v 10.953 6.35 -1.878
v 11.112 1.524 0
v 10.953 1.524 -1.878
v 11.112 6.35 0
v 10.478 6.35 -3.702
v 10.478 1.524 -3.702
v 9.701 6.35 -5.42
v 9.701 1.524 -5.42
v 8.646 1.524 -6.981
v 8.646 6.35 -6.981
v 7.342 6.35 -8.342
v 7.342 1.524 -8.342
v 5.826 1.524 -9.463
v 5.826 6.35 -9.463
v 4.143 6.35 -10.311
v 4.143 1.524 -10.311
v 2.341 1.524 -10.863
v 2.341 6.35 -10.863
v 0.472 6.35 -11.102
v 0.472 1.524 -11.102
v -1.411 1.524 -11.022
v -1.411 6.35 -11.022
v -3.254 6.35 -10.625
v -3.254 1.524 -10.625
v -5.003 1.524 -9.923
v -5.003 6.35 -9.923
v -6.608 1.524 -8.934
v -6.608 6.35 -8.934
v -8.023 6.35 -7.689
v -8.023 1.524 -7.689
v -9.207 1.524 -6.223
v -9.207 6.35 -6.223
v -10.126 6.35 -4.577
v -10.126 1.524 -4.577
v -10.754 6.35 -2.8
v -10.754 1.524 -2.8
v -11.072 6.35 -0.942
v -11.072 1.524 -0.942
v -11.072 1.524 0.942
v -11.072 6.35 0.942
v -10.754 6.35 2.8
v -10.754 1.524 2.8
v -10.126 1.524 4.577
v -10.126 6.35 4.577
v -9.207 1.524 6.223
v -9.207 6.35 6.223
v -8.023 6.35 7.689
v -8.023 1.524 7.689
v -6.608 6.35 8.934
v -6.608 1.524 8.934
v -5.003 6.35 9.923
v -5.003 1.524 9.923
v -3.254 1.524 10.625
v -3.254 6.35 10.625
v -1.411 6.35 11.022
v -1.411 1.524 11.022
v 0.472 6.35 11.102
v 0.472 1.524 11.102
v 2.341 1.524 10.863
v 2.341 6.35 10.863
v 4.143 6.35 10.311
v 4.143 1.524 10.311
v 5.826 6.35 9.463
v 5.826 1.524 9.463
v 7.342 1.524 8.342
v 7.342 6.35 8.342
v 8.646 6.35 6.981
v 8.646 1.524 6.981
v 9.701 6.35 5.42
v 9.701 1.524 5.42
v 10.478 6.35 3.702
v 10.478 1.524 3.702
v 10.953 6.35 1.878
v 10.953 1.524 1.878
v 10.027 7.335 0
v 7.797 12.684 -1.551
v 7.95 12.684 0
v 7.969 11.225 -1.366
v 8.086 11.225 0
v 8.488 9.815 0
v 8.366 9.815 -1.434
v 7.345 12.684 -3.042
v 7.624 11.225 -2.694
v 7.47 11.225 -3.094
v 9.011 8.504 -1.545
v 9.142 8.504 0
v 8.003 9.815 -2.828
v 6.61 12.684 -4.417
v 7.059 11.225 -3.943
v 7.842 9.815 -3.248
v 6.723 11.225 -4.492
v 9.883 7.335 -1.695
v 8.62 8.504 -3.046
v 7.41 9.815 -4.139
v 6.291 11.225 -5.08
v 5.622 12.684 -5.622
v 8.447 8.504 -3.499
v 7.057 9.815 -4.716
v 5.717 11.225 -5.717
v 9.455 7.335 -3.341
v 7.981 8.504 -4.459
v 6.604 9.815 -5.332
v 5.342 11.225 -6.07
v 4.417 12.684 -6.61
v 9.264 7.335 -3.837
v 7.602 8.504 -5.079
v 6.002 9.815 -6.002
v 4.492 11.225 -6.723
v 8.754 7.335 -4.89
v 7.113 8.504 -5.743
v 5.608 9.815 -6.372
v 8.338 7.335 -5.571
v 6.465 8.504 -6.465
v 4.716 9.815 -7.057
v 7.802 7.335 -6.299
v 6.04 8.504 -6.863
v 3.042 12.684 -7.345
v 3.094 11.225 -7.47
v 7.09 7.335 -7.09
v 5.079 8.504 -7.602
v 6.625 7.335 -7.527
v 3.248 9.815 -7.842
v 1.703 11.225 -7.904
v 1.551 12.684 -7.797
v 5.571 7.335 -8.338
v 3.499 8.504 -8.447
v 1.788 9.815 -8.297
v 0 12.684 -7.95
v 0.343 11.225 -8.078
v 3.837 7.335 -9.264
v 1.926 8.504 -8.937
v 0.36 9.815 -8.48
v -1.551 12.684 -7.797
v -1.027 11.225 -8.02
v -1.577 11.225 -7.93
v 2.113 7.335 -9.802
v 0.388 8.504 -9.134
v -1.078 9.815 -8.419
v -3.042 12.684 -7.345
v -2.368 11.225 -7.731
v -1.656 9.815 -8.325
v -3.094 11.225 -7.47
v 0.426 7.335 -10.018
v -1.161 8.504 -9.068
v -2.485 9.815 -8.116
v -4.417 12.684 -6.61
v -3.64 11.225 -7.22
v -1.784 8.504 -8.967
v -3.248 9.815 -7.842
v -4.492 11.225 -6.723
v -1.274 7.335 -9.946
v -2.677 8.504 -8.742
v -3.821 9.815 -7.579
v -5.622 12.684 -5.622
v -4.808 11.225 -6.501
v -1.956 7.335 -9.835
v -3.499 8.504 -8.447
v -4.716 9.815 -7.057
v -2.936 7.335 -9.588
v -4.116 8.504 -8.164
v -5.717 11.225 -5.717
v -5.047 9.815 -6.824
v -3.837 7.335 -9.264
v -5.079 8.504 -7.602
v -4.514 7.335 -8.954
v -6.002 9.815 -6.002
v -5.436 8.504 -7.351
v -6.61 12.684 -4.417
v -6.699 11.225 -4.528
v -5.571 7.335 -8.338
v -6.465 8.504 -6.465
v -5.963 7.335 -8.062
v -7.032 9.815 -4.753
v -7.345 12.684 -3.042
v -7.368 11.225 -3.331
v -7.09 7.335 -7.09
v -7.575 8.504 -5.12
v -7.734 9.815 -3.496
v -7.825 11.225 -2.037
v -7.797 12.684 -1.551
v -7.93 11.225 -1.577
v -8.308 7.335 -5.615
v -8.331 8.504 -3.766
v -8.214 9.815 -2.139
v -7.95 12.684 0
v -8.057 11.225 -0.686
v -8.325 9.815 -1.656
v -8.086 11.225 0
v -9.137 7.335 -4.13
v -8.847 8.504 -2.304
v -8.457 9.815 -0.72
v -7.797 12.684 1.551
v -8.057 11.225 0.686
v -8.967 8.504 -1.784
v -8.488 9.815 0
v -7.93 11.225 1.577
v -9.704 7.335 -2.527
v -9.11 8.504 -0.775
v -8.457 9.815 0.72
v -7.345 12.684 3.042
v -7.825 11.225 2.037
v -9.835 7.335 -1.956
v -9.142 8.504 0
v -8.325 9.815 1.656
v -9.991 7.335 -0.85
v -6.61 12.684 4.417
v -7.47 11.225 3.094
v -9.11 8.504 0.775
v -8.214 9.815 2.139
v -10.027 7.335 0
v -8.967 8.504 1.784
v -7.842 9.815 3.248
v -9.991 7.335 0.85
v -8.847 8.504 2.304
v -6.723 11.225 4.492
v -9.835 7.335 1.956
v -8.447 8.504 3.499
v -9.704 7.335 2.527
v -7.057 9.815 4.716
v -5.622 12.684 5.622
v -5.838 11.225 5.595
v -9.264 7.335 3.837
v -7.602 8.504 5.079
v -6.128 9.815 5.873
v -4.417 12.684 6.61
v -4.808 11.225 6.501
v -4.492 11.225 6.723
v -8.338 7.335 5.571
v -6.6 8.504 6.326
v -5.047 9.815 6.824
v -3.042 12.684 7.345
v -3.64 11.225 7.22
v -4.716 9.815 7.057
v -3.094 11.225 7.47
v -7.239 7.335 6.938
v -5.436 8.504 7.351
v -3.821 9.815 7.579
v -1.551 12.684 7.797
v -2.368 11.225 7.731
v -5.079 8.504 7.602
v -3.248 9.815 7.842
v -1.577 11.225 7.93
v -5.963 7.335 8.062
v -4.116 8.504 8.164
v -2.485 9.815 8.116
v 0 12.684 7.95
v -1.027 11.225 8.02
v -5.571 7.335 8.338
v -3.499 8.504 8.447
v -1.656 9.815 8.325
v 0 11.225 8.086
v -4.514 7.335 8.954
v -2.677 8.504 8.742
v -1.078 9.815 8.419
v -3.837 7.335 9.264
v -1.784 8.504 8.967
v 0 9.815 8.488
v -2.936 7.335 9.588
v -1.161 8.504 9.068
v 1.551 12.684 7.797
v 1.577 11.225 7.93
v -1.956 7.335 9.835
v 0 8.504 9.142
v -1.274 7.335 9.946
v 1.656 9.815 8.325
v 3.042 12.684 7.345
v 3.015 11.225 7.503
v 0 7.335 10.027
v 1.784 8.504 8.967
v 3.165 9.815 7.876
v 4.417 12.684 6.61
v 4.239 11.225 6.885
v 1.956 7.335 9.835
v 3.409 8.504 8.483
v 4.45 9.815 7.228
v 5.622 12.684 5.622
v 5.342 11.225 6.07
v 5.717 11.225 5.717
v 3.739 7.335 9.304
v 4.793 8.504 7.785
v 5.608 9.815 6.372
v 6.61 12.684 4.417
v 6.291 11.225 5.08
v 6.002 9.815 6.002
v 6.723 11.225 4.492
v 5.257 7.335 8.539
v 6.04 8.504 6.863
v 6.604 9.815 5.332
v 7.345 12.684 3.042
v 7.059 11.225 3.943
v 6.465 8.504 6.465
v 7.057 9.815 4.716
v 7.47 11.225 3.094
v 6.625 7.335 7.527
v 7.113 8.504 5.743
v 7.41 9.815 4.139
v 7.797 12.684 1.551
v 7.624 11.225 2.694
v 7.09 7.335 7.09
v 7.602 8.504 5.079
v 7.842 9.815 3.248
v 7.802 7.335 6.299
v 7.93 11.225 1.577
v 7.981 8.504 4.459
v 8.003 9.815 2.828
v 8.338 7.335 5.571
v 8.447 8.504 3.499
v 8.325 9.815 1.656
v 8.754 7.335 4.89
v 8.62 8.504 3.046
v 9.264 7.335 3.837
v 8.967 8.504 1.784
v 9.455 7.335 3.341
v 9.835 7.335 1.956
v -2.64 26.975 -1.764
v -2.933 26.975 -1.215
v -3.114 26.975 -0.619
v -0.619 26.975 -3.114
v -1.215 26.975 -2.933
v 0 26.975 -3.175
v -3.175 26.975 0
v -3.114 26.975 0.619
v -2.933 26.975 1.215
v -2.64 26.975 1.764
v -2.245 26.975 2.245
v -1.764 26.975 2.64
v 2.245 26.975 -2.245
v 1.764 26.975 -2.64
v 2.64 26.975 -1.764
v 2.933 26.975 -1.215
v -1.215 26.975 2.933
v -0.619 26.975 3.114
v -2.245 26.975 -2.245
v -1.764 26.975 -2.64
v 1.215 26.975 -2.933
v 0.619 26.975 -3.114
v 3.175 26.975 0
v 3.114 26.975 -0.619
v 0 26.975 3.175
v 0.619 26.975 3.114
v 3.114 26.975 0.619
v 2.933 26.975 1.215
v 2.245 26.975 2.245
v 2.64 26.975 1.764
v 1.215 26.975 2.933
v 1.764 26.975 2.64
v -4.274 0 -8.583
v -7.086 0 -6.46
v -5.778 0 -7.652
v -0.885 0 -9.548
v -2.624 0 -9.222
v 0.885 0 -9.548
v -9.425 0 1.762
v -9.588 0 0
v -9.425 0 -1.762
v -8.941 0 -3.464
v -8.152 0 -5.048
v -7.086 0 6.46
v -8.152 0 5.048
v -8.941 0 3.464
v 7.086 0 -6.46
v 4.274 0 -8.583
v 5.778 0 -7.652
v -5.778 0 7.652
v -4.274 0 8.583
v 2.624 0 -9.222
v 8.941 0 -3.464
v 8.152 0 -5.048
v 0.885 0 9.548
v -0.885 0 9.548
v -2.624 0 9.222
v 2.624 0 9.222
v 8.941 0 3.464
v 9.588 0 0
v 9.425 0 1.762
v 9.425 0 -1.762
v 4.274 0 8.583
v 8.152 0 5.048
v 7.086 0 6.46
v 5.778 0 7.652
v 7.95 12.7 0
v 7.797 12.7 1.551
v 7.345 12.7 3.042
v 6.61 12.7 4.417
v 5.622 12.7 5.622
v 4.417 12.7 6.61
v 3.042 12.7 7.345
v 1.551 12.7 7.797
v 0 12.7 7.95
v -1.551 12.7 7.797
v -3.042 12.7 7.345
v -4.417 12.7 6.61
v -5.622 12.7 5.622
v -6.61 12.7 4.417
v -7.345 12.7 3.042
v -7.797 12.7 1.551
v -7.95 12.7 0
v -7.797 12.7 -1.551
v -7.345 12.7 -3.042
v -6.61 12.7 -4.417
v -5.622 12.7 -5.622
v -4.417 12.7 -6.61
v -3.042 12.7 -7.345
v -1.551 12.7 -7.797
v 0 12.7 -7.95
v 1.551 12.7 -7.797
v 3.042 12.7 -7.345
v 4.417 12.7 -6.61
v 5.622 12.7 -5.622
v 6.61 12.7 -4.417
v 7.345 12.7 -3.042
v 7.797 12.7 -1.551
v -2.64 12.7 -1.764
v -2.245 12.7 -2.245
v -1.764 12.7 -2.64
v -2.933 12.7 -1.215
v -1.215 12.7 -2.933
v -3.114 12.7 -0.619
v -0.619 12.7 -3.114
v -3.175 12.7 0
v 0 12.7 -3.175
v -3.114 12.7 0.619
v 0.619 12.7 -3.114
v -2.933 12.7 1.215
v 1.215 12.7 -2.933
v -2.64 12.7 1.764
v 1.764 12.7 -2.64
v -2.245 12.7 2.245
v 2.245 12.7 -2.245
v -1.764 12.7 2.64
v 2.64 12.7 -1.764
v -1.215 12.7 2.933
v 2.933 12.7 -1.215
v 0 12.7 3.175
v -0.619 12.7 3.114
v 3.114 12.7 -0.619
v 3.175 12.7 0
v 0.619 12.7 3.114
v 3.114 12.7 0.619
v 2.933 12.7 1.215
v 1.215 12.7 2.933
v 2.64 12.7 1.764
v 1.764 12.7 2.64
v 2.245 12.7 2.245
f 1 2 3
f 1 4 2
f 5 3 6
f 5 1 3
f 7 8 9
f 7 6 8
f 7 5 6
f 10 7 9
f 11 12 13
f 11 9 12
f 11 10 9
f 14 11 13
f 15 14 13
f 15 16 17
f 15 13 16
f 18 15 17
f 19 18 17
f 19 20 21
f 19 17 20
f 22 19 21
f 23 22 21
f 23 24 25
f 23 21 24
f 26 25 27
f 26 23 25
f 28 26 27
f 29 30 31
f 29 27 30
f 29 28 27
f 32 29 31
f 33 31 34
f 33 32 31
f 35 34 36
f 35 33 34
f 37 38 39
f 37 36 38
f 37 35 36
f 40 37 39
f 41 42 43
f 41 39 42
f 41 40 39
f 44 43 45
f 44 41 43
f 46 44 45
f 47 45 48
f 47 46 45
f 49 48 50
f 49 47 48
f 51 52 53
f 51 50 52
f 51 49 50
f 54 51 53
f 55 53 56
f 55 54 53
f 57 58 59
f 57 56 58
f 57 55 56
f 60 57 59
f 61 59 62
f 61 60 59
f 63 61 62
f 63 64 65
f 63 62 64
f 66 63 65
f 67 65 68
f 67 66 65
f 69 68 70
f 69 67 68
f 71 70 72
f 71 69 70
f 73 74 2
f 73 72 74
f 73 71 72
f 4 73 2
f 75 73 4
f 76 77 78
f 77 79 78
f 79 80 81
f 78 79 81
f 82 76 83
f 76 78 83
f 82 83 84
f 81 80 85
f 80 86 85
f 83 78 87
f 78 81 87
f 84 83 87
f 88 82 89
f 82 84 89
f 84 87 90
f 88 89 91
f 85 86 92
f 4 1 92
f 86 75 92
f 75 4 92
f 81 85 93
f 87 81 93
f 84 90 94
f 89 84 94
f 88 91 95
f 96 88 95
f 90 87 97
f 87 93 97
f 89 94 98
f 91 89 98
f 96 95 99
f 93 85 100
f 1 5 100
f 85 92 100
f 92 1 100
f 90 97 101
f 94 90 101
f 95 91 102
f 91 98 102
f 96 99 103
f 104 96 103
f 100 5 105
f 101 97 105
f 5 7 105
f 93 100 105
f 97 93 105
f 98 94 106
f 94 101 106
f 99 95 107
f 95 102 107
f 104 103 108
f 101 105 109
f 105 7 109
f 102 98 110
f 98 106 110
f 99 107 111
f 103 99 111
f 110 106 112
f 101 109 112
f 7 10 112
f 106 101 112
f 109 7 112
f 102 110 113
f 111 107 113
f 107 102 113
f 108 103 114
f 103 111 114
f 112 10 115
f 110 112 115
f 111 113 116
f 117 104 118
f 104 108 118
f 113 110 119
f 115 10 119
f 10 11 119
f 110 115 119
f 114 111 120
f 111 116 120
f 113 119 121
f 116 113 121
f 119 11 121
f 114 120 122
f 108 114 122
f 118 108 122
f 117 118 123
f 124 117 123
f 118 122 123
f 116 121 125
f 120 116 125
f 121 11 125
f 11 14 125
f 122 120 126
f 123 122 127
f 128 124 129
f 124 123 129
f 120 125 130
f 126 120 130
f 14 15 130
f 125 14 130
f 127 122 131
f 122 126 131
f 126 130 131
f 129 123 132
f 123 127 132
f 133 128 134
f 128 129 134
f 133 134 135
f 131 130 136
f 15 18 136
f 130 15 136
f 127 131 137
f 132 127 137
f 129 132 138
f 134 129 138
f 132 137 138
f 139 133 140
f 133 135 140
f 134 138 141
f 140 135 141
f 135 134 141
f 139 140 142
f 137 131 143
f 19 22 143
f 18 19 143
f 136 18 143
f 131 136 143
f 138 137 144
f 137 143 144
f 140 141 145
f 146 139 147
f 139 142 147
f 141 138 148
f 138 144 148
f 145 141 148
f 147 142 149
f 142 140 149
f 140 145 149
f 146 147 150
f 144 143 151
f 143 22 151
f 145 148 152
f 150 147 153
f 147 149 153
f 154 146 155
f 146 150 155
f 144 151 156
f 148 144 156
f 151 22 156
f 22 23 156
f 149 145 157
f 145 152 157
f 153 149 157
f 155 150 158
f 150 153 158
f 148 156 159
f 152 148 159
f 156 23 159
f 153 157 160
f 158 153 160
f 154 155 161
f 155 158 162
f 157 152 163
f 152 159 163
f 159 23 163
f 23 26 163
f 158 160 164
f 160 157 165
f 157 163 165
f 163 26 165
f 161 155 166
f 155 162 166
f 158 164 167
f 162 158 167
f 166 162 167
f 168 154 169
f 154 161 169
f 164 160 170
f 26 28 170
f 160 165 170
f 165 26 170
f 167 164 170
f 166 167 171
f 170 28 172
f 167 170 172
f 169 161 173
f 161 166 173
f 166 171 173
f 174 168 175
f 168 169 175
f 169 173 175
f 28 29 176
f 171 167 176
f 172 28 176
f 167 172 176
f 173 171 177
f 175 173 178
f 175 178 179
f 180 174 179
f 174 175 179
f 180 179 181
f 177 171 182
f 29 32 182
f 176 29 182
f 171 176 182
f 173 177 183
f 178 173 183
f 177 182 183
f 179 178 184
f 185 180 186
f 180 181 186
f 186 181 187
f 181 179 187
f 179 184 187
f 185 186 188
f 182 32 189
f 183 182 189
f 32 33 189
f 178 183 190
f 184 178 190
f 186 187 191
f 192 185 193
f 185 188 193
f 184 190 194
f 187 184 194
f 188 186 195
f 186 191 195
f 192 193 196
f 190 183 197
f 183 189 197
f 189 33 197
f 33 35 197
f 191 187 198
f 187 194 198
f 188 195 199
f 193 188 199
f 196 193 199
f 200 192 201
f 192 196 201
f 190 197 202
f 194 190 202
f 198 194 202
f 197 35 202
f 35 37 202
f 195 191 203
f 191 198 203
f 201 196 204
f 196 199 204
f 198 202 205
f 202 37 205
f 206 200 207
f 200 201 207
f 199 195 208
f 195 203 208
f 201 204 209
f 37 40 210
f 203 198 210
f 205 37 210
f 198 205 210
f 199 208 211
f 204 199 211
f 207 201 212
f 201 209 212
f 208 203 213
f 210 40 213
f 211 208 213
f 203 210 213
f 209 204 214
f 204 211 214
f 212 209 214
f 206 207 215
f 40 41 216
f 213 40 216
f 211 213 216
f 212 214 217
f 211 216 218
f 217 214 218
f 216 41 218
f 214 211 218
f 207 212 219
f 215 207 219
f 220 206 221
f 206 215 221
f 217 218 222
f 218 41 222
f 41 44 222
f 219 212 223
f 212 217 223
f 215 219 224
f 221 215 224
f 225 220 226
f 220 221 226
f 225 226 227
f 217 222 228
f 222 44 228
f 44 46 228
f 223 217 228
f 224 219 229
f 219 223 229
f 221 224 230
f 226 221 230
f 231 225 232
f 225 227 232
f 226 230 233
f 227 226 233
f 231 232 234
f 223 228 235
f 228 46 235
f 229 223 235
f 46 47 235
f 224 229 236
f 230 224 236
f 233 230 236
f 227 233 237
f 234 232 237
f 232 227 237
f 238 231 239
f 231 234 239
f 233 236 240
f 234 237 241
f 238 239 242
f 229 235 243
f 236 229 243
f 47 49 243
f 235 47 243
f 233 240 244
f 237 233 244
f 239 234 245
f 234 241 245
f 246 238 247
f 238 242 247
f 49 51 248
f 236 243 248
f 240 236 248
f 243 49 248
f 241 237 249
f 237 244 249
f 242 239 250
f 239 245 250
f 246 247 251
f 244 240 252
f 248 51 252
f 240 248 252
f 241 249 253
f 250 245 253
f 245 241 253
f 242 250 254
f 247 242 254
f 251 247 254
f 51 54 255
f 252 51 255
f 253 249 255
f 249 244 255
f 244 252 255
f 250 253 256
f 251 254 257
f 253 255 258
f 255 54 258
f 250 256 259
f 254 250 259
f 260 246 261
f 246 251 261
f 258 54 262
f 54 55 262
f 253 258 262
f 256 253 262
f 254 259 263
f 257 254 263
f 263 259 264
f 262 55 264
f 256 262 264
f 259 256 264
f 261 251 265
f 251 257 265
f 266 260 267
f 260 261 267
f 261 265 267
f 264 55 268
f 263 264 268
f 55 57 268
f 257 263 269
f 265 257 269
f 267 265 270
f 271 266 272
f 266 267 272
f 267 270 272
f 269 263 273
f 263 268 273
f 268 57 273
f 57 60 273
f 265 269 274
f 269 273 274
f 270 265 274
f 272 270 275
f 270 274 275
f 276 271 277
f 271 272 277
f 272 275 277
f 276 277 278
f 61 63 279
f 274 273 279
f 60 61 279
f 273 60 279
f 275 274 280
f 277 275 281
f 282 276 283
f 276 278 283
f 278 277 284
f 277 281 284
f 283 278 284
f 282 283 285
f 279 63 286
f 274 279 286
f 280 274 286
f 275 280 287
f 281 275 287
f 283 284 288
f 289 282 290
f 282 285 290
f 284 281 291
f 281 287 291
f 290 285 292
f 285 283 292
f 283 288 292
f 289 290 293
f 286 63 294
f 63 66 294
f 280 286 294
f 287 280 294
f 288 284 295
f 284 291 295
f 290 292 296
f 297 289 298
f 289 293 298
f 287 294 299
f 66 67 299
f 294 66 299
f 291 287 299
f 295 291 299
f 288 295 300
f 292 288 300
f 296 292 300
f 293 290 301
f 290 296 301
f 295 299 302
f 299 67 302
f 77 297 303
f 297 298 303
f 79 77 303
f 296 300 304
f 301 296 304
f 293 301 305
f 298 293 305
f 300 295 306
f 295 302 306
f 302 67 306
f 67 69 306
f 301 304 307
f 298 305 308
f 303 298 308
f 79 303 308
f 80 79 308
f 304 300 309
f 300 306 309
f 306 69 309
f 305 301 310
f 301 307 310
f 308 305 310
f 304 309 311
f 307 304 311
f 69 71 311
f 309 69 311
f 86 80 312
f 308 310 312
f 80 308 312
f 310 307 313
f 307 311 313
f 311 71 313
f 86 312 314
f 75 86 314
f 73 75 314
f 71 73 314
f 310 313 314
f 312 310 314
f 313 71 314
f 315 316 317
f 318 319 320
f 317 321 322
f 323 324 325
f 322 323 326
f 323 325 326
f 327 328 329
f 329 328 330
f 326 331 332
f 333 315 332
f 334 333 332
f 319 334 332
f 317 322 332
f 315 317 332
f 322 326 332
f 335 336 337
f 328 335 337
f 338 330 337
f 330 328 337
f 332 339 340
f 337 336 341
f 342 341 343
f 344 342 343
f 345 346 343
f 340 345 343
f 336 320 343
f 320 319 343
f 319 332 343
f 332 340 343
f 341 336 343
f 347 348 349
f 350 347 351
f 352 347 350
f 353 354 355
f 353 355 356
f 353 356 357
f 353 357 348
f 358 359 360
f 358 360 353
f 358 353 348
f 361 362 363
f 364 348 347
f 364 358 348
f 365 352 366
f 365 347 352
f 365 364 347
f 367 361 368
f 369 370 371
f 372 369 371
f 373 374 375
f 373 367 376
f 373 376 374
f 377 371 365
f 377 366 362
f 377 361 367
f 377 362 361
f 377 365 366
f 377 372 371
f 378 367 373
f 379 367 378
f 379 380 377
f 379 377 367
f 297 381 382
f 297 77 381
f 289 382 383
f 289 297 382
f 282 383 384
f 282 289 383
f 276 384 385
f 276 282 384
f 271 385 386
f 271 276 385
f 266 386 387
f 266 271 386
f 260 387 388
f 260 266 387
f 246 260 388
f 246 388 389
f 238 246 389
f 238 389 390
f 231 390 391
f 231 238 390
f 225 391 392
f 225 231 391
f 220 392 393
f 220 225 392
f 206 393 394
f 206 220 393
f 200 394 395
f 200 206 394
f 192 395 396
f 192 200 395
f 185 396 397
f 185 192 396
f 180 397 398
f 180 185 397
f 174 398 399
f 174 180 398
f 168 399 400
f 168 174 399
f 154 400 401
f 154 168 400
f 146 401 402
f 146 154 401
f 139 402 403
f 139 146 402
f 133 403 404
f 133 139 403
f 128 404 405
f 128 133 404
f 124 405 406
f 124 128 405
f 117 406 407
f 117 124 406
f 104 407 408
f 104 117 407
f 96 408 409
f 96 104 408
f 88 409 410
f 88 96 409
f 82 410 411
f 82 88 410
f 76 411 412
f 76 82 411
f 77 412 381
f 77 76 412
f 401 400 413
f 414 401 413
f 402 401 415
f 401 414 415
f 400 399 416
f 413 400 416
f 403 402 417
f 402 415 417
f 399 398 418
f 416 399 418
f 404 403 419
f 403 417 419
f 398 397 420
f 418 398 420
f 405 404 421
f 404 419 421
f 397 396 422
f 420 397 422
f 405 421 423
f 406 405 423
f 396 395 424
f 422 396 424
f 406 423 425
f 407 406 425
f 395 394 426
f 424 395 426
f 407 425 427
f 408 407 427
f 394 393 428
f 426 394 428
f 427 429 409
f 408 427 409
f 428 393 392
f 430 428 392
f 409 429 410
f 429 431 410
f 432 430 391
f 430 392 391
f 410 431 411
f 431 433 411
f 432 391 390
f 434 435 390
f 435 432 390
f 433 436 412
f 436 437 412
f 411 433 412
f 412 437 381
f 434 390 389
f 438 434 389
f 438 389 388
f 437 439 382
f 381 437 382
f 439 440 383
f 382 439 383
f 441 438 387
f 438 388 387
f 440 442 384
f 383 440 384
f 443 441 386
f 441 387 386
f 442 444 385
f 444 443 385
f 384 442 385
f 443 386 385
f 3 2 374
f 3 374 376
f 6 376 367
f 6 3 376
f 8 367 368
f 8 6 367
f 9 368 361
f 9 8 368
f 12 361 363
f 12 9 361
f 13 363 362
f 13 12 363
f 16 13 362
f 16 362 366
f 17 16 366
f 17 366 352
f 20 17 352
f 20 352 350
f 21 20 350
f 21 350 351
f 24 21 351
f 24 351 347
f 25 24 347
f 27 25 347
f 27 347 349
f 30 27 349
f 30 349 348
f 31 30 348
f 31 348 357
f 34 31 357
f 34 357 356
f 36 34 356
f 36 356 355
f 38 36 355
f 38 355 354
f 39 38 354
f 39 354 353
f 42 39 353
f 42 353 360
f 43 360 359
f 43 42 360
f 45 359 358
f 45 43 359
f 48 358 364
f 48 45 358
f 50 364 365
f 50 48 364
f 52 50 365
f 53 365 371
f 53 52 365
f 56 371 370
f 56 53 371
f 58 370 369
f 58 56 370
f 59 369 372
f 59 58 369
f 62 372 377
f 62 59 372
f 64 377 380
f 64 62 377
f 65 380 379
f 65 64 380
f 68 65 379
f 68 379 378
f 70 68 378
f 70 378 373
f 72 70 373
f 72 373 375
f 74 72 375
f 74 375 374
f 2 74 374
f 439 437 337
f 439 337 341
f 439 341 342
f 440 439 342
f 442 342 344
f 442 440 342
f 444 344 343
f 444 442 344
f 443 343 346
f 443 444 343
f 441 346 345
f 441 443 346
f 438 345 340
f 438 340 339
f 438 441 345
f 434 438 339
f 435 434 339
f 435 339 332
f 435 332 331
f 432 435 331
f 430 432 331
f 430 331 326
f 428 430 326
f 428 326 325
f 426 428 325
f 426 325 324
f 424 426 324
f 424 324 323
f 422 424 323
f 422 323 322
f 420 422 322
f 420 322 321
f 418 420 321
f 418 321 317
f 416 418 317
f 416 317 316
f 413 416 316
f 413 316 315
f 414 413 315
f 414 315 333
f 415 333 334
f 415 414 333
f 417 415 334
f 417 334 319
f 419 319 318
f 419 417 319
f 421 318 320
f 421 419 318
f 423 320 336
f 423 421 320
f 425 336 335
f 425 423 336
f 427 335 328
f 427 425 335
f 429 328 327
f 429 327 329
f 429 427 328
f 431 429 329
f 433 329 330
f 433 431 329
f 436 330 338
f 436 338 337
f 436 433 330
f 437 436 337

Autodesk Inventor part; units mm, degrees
ref_plane "YZ Plane" through (0, 0, 0) normal (1, 0, 0) x (0, 1, 0)
ref_plane "XZ Plane" through (0, 0, 0) normal (0, 1, 0) x (-1, 0, 0)
ref_plane "XY Plane" through (0, 0, 0) normal (0, 0, 1) x (1, 0, 0)
sketch "Sketch1" plane through (0, 0, 0) normal (0, 0, 1) x (1, 0, 0)
  line L0 (0, 0) -> (11.1125, 0)
  line L1 (11.1125, 0) -> (11.1125, 6.35)
  line L2 (3.175, 26.9748) -> (0, 26.9748)
  line L3 (0, 26.9748) -> (0, 0)
  line L4 (3.175, 26.9748) -> (3.175, 12.7)
  line L5 (3.175, 12.7) -> (7.9502, 12.7)
  line L6 (7.9502, 12.7) -> (7.9502, 6.35)
  line L7 (7.9502, 6.35) -> (11.1125, 6.35)
  dimension "d2" = 3.175
  dimension "d3" = 7.9502
revolve "Revolution1" add sketch "Sketch1" angle 360 about axis through (0, 26.9748, 0) along (0, -1, 0)
fillet "Fillet1" radius 7.9248 1 edges at (-7.9502, 6.35, 0)
chamfer "Chamfer1" distance 1.524 angle 45 1 edges at (-11.1125, 0, 0)
properties part number "Rack Pad" material "Stainless Steel"
